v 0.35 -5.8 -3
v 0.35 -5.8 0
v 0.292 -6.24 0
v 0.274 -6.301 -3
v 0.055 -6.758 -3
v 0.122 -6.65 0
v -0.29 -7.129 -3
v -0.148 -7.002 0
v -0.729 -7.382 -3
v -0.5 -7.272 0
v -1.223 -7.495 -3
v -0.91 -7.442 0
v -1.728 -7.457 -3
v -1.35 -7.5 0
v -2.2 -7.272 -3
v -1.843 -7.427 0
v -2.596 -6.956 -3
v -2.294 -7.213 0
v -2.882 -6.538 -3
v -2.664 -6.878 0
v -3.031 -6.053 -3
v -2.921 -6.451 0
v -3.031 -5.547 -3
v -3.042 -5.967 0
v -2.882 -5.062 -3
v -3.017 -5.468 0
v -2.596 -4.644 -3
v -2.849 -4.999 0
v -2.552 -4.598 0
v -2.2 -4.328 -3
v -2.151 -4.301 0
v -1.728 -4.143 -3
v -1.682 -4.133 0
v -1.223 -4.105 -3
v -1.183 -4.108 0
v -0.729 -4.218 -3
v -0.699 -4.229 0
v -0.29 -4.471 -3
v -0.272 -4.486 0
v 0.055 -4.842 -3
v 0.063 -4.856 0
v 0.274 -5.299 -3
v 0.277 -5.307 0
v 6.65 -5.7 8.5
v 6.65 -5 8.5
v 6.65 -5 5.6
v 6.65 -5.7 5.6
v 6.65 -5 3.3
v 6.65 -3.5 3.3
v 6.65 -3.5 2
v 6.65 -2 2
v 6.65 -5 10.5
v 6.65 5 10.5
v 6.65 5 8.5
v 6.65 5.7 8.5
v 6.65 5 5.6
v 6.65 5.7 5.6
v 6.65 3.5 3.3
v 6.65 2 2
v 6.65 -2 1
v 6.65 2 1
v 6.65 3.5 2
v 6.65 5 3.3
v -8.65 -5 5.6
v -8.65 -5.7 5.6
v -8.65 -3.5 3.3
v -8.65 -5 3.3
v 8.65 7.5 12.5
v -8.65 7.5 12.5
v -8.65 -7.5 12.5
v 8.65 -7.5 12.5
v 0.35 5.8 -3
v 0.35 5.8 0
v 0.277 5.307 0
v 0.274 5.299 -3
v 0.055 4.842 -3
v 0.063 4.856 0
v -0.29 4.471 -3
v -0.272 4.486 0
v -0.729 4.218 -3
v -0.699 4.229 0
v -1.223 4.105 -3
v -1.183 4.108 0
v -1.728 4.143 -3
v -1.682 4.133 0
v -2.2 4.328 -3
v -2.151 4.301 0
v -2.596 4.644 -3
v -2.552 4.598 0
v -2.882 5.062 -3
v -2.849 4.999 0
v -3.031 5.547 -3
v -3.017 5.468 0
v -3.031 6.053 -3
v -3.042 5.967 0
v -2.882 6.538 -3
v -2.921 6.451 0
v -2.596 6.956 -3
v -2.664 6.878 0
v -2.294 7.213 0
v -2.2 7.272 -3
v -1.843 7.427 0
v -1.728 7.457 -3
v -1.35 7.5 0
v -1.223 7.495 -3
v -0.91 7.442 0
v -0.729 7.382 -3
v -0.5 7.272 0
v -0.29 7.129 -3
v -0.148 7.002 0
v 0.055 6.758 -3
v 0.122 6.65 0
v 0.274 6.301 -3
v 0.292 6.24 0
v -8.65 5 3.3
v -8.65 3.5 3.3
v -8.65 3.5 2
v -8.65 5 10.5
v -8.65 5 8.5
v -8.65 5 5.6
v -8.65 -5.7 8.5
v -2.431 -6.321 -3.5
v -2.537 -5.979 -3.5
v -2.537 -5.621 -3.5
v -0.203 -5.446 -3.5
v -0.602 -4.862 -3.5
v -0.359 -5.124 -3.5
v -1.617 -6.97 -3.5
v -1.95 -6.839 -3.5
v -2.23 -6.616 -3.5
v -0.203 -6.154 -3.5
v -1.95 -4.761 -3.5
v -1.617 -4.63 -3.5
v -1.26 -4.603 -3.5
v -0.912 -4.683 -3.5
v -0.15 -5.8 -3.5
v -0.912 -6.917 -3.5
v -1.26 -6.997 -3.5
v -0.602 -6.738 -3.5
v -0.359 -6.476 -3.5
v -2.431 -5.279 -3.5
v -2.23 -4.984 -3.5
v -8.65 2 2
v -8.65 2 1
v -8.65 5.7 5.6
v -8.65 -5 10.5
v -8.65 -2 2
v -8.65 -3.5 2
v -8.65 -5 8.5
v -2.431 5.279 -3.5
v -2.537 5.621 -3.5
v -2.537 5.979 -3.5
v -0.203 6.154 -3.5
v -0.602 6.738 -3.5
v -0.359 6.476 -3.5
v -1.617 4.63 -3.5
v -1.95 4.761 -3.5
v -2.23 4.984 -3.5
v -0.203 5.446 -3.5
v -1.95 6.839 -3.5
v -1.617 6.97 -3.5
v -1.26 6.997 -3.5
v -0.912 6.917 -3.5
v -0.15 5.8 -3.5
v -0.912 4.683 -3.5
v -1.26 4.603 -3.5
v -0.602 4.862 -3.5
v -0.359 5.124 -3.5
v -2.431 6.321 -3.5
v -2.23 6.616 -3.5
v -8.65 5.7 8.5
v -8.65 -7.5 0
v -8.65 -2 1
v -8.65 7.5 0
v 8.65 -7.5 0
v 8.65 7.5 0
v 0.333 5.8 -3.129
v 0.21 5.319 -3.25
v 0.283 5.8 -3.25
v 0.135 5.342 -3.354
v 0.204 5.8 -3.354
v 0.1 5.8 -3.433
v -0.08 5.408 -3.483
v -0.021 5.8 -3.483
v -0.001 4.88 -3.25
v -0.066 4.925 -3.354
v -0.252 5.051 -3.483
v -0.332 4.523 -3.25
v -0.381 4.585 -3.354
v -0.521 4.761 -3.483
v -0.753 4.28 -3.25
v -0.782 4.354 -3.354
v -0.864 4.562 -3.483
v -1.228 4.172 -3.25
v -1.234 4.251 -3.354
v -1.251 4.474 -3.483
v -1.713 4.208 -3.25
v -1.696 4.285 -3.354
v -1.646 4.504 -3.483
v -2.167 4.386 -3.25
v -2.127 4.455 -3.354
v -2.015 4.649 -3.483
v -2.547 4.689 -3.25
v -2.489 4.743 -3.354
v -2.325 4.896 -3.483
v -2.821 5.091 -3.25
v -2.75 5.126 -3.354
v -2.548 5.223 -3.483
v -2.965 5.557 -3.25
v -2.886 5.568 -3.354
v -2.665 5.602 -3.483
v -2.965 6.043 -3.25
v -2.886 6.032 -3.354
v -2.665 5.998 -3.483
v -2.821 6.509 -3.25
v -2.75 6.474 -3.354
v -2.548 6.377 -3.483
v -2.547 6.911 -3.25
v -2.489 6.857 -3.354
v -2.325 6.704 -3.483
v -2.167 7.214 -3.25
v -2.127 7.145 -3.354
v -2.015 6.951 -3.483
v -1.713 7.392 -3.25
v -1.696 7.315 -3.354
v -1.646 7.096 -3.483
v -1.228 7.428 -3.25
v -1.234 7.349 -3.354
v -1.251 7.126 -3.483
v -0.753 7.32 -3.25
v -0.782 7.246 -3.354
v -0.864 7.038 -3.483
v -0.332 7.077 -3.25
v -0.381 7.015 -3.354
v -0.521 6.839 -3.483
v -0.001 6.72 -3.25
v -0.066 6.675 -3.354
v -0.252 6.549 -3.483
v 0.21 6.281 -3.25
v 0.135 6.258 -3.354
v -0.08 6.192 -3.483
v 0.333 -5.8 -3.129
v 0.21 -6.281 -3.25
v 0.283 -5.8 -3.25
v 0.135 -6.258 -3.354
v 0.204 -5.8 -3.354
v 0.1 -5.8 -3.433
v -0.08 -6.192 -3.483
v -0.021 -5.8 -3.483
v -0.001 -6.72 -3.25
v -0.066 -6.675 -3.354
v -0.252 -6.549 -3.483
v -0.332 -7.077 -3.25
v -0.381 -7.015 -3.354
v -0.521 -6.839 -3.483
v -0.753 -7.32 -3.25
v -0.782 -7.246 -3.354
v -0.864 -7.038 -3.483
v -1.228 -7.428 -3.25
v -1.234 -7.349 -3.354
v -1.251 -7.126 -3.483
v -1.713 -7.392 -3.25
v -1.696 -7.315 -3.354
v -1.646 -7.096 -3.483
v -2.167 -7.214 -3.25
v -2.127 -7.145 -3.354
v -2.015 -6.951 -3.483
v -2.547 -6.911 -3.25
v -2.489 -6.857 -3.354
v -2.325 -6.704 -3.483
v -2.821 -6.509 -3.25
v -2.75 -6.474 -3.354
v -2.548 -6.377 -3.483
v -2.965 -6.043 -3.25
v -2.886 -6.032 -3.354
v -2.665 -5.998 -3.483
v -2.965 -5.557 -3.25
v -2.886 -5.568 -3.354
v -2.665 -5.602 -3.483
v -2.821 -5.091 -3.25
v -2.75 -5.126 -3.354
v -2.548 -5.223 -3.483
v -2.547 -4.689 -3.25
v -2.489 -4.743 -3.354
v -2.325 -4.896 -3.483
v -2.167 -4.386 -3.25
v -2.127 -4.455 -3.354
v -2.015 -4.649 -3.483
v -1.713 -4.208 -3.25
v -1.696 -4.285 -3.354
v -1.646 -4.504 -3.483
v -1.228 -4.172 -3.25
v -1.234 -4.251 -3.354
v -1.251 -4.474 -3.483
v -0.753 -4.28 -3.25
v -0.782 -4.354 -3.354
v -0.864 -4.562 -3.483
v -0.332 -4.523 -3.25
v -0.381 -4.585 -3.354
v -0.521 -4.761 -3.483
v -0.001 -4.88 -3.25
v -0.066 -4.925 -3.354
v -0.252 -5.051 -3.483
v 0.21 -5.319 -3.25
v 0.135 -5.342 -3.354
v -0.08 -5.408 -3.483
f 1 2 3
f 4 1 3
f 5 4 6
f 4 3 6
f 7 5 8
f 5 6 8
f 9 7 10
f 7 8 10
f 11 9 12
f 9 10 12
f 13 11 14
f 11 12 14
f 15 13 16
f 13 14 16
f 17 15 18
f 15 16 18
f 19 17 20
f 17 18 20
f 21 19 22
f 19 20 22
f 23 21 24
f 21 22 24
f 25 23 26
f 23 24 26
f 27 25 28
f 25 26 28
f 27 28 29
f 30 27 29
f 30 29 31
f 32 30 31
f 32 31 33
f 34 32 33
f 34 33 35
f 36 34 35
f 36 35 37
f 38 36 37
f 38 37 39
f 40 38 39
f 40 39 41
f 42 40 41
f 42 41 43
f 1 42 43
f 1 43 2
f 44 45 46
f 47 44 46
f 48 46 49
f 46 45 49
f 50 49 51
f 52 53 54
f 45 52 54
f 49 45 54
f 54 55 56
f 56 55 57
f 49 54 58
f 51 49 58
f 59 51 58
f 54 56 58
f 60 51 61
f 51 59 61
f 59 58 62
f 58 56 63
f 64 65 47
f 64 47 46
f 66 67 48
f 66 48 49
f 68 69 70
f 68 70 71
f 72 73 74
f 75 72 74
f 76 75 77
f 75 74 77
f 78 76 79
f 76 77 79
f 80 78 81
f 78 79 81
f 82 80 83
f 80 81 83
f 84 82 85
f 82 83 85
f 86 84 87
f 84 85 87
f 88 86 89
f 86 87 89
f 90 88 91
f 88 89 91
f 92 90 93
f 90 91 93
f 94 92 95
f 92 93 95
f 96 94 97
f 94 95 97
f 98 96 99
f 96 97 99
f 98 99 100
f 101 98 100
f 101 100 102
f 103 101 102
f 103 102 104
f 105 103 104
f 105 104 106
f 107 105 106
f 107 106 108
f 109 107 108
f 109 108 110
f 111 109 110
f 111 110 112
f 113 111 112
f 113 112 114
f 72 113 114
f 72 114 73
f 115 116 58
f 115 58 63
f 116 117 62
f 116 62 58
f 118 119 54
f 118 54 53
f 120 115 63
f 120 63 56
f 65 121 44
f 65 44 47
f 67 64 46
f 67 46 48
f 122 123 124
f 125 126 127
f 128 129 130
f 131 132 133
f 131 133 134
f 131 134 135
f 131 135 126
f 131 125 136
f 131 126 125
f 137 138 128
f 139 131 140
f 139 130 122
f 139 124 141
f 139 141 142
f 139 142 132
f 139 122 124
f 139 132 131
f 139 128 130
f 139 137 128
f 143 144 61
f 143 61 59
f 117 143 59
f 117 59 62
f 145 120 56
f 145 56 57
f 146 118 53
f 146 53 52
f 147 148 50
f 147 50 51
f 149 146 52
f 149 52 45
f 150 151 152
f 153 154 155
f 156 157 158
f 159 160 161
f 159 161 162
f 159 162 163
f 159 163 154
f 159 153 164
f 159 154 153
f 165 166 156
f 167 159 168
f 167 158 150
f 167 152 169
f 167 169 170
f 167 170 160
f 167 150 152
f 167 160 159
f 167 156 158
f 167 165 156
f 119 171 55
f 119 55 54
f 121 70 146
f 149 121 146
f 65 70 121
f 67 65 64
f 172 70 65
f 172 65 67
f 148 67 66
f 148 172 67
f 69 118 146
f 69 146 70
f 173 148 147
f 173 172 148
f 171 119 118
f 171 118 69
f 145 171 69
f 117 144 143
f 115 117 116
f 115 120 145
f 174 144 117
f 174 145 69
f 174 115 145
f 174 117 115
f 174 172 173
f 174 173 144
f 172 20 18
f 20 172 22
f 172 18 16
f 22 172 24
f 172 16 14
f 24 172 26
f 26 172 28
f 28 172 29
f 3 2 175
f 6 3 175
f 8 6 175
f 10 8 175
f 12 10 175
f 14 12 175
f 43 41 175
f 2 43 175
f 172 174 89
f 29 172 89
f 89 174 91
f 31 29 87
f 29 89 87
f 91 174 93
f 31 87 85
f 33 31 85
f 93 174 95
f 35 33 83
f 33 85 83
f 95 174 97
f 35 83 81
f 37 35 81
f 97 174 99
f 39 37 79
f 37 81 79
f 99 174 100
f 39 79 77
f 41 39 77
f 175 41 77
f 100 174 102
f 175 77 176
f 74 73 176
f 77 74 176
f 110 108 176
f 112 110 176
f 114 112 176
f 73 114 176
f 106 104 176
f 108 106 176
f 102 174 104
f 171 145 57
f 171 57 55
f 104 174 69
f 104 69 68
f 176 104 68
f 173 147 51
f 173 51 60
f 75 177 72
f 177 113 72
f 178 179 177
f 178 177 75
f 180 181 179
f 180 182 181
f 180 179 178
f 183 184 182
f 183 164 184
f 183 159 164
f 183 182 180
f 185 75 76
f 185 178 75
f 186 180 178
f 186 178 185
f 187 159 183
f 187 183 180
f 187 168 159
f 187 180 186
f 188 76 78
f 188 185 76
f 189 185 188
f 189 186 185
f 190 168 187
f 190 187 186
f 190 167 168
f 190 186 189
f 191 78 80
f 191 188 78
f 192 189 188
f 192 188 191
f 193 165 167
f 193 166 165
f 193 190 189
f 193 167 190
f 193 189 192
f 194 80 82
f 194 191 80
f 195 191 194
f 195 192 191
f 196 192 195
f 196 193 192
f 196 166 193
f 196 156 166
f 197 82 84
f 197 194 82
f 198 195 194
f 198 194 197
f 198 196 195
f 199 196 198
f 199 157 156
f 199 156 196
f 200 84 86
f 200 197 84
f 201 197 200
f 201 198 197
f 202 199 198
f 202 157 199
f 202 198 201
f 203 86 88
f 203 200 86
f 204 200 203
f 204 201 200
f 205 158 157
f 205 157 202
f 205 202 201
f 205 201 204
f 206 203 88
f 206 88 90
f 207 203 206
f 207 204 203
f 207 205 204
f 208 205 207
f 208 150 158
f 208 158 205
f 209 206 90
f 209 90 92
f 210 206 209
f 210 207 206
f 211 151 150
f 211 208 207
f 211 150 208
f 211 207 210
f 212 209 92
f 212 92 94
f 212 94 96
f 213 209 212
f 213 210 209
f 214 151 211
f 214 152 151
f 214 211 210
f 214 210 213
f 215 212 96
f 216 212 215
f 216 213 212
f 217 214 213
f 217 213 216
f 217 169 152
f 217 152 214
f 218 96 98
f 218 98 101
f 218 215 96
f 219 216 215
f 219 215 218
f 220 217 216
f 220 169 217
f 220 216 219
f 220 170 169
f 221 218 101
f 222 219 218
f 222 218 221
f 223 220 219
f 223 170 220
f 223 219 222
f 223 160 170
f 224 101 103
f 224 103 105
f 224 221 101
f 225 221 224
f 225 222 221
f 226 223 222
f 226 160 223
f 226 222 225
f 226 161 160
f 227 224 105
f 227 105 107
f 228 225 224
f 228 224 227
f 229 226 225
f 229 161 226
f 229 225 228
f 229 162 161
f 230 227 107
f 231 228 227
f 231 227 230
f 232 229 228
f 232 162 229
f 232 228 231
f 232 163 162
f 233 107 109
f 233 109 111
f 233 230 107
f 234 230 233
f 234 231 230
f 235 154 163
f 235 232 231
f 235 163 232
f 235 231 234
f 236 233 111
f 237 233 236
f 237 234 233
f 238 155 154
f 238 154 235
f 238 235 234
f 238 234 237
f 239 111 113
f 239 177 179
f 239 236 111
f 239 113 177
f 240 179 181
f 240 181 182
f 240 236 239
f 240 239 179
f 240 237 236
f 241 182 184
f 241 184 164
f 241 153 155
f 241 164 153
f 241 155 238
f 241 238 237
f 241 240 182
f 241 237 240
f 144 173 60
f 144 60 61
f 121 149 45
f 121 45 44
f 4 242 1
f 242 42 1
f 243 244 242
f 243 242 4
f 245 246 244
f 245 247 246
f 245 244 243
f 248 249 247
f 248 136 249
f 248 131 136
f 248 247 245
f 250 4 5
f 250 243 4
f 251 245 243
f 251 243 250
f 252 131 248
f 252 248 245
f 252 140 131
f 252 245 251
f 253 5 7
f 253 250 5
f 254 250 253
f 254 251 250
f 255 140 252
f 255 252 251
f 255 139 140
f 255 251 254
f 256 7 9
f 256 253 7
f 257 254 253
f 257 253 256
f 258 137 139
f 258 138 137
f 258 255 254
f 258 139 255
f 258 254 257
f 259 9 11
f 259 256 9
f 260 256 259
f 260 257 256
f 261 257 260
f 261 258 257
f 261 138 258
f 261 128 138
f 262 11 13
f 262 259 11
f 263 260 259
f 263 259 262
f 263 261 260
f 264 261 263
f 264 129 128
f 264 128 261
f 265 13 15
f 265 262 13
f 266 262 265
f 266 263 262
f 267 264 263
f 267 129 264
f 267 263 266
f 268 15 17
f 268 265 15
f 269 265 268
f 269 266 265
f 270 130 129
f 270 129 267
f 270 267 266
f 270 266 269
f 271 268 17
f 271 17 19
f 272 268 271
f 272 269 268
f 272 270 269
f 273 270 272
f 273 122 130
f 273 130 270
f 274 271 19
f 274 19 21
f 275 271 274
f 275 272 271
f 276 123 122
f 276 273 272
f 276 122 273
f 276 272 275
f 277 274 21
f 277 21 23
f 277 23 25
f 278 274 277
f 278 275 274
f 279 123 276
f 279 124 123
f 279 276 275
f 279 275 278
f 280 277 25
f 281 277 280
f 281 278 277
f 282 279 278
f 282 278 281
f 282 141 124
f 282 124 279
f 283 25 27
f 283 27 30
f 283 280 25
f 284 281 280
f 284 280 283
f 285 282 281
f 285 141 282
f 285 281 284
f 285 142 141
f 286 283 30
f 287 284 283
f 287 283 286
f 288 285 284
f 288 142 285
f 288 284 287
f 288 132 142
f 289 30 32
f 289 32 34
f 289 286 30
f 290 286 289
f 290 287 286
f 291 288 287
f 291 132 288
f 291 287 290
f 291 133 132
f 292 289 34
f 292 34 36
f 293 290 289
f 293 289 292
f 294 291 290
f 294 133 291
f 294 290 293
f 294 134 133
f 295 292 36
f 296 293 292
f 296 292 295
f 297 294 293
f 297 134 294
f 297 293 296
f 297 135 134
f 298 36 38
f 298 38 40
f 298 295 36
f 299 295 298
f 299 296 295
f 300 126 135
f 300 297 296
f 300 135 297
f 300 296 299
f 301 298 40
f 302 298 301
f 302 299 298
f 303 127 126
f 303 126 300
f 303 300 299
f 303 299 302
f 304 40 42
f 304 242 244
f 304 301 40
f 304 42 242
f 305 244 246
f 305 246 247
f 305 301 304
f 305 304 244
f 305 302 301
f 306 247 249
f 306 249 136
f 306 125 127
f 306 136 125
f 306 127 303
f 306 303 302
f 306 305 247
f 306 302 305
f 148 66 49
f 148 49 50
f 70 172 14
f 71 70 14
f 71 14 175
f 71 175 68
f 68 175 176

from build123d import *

# Parameters (mm, degrees)
SKETCH1_W           = 17.3
SKETCH1_H           = 15
BOSS_EXTRUDE1_DEPTH = 12.5
CUT_EXTRUDE1_DEPTH  = 15.3
SKETCH3_R           = 1.7
BOSS_EXTRUDE2_DEPTH = 3.5
FILLET1_R           = 0.5


with BuildPart() as part:
    # Sketch1 → Boss-Extrude1 (new body)
    with BuildSketch(Plane.XY):
        Rectangle(SKETCH1_W, SKETCH1_H)
    extrude(amount=BOSS_EXTRUDE1_DEPTH)

    # Sketch2 → Cut-Extrude1 (cut)
    with BuildSketch(Plane.ZY.offset(8.65)):
        Polygon((10.5, 5), (10.5, -5), (8.5, -5), (8.5, -5.7), (5.6, -5.7), (5.6, -5), (3.3, -5), (3.3, -3.5), (2, -3.5), (2, -2), (1, -2), (1, 2), (2, 2), (2, 3.5), (3.3, 3.5), (3.3, 5), (5.6, 5), (5.6, 5.7), (8.5, 5.7), (8.5, 5), align=None)
    extrude(amount=-CUT_EXTRUDE1_DEPTH, mode=Mode.SUBTRACT)

    # Sketch3 → Boss-Extrude2 (add)
    with BuildSketch(Plane(origin=(0, 0, 0), x_dir=(-1, 0, 0), z_dir=(0, 0, -1))):
        with Locations(Location((1.35, 5.8, 0), (0, 0, 180))):
            Circle(SKETCH3_R)
        with Locations(Location((1.35, -5.8, 0), (0, 0, 180))):
            Circle(SKETCH3_R)
    extrude(amount=BOSS_EXTRUDE2_DEPTH)

    # Fillet1
    fillet1_edges = [part.edges().sort_by_distance(p)[0] for p in [
        (-3.05, 5.8, -3.5),
        (-3.05, -5.8, -3.5),
    ]]
    fillet(fillet1_edges, radius=FILLET1_R)


solid = part.part
